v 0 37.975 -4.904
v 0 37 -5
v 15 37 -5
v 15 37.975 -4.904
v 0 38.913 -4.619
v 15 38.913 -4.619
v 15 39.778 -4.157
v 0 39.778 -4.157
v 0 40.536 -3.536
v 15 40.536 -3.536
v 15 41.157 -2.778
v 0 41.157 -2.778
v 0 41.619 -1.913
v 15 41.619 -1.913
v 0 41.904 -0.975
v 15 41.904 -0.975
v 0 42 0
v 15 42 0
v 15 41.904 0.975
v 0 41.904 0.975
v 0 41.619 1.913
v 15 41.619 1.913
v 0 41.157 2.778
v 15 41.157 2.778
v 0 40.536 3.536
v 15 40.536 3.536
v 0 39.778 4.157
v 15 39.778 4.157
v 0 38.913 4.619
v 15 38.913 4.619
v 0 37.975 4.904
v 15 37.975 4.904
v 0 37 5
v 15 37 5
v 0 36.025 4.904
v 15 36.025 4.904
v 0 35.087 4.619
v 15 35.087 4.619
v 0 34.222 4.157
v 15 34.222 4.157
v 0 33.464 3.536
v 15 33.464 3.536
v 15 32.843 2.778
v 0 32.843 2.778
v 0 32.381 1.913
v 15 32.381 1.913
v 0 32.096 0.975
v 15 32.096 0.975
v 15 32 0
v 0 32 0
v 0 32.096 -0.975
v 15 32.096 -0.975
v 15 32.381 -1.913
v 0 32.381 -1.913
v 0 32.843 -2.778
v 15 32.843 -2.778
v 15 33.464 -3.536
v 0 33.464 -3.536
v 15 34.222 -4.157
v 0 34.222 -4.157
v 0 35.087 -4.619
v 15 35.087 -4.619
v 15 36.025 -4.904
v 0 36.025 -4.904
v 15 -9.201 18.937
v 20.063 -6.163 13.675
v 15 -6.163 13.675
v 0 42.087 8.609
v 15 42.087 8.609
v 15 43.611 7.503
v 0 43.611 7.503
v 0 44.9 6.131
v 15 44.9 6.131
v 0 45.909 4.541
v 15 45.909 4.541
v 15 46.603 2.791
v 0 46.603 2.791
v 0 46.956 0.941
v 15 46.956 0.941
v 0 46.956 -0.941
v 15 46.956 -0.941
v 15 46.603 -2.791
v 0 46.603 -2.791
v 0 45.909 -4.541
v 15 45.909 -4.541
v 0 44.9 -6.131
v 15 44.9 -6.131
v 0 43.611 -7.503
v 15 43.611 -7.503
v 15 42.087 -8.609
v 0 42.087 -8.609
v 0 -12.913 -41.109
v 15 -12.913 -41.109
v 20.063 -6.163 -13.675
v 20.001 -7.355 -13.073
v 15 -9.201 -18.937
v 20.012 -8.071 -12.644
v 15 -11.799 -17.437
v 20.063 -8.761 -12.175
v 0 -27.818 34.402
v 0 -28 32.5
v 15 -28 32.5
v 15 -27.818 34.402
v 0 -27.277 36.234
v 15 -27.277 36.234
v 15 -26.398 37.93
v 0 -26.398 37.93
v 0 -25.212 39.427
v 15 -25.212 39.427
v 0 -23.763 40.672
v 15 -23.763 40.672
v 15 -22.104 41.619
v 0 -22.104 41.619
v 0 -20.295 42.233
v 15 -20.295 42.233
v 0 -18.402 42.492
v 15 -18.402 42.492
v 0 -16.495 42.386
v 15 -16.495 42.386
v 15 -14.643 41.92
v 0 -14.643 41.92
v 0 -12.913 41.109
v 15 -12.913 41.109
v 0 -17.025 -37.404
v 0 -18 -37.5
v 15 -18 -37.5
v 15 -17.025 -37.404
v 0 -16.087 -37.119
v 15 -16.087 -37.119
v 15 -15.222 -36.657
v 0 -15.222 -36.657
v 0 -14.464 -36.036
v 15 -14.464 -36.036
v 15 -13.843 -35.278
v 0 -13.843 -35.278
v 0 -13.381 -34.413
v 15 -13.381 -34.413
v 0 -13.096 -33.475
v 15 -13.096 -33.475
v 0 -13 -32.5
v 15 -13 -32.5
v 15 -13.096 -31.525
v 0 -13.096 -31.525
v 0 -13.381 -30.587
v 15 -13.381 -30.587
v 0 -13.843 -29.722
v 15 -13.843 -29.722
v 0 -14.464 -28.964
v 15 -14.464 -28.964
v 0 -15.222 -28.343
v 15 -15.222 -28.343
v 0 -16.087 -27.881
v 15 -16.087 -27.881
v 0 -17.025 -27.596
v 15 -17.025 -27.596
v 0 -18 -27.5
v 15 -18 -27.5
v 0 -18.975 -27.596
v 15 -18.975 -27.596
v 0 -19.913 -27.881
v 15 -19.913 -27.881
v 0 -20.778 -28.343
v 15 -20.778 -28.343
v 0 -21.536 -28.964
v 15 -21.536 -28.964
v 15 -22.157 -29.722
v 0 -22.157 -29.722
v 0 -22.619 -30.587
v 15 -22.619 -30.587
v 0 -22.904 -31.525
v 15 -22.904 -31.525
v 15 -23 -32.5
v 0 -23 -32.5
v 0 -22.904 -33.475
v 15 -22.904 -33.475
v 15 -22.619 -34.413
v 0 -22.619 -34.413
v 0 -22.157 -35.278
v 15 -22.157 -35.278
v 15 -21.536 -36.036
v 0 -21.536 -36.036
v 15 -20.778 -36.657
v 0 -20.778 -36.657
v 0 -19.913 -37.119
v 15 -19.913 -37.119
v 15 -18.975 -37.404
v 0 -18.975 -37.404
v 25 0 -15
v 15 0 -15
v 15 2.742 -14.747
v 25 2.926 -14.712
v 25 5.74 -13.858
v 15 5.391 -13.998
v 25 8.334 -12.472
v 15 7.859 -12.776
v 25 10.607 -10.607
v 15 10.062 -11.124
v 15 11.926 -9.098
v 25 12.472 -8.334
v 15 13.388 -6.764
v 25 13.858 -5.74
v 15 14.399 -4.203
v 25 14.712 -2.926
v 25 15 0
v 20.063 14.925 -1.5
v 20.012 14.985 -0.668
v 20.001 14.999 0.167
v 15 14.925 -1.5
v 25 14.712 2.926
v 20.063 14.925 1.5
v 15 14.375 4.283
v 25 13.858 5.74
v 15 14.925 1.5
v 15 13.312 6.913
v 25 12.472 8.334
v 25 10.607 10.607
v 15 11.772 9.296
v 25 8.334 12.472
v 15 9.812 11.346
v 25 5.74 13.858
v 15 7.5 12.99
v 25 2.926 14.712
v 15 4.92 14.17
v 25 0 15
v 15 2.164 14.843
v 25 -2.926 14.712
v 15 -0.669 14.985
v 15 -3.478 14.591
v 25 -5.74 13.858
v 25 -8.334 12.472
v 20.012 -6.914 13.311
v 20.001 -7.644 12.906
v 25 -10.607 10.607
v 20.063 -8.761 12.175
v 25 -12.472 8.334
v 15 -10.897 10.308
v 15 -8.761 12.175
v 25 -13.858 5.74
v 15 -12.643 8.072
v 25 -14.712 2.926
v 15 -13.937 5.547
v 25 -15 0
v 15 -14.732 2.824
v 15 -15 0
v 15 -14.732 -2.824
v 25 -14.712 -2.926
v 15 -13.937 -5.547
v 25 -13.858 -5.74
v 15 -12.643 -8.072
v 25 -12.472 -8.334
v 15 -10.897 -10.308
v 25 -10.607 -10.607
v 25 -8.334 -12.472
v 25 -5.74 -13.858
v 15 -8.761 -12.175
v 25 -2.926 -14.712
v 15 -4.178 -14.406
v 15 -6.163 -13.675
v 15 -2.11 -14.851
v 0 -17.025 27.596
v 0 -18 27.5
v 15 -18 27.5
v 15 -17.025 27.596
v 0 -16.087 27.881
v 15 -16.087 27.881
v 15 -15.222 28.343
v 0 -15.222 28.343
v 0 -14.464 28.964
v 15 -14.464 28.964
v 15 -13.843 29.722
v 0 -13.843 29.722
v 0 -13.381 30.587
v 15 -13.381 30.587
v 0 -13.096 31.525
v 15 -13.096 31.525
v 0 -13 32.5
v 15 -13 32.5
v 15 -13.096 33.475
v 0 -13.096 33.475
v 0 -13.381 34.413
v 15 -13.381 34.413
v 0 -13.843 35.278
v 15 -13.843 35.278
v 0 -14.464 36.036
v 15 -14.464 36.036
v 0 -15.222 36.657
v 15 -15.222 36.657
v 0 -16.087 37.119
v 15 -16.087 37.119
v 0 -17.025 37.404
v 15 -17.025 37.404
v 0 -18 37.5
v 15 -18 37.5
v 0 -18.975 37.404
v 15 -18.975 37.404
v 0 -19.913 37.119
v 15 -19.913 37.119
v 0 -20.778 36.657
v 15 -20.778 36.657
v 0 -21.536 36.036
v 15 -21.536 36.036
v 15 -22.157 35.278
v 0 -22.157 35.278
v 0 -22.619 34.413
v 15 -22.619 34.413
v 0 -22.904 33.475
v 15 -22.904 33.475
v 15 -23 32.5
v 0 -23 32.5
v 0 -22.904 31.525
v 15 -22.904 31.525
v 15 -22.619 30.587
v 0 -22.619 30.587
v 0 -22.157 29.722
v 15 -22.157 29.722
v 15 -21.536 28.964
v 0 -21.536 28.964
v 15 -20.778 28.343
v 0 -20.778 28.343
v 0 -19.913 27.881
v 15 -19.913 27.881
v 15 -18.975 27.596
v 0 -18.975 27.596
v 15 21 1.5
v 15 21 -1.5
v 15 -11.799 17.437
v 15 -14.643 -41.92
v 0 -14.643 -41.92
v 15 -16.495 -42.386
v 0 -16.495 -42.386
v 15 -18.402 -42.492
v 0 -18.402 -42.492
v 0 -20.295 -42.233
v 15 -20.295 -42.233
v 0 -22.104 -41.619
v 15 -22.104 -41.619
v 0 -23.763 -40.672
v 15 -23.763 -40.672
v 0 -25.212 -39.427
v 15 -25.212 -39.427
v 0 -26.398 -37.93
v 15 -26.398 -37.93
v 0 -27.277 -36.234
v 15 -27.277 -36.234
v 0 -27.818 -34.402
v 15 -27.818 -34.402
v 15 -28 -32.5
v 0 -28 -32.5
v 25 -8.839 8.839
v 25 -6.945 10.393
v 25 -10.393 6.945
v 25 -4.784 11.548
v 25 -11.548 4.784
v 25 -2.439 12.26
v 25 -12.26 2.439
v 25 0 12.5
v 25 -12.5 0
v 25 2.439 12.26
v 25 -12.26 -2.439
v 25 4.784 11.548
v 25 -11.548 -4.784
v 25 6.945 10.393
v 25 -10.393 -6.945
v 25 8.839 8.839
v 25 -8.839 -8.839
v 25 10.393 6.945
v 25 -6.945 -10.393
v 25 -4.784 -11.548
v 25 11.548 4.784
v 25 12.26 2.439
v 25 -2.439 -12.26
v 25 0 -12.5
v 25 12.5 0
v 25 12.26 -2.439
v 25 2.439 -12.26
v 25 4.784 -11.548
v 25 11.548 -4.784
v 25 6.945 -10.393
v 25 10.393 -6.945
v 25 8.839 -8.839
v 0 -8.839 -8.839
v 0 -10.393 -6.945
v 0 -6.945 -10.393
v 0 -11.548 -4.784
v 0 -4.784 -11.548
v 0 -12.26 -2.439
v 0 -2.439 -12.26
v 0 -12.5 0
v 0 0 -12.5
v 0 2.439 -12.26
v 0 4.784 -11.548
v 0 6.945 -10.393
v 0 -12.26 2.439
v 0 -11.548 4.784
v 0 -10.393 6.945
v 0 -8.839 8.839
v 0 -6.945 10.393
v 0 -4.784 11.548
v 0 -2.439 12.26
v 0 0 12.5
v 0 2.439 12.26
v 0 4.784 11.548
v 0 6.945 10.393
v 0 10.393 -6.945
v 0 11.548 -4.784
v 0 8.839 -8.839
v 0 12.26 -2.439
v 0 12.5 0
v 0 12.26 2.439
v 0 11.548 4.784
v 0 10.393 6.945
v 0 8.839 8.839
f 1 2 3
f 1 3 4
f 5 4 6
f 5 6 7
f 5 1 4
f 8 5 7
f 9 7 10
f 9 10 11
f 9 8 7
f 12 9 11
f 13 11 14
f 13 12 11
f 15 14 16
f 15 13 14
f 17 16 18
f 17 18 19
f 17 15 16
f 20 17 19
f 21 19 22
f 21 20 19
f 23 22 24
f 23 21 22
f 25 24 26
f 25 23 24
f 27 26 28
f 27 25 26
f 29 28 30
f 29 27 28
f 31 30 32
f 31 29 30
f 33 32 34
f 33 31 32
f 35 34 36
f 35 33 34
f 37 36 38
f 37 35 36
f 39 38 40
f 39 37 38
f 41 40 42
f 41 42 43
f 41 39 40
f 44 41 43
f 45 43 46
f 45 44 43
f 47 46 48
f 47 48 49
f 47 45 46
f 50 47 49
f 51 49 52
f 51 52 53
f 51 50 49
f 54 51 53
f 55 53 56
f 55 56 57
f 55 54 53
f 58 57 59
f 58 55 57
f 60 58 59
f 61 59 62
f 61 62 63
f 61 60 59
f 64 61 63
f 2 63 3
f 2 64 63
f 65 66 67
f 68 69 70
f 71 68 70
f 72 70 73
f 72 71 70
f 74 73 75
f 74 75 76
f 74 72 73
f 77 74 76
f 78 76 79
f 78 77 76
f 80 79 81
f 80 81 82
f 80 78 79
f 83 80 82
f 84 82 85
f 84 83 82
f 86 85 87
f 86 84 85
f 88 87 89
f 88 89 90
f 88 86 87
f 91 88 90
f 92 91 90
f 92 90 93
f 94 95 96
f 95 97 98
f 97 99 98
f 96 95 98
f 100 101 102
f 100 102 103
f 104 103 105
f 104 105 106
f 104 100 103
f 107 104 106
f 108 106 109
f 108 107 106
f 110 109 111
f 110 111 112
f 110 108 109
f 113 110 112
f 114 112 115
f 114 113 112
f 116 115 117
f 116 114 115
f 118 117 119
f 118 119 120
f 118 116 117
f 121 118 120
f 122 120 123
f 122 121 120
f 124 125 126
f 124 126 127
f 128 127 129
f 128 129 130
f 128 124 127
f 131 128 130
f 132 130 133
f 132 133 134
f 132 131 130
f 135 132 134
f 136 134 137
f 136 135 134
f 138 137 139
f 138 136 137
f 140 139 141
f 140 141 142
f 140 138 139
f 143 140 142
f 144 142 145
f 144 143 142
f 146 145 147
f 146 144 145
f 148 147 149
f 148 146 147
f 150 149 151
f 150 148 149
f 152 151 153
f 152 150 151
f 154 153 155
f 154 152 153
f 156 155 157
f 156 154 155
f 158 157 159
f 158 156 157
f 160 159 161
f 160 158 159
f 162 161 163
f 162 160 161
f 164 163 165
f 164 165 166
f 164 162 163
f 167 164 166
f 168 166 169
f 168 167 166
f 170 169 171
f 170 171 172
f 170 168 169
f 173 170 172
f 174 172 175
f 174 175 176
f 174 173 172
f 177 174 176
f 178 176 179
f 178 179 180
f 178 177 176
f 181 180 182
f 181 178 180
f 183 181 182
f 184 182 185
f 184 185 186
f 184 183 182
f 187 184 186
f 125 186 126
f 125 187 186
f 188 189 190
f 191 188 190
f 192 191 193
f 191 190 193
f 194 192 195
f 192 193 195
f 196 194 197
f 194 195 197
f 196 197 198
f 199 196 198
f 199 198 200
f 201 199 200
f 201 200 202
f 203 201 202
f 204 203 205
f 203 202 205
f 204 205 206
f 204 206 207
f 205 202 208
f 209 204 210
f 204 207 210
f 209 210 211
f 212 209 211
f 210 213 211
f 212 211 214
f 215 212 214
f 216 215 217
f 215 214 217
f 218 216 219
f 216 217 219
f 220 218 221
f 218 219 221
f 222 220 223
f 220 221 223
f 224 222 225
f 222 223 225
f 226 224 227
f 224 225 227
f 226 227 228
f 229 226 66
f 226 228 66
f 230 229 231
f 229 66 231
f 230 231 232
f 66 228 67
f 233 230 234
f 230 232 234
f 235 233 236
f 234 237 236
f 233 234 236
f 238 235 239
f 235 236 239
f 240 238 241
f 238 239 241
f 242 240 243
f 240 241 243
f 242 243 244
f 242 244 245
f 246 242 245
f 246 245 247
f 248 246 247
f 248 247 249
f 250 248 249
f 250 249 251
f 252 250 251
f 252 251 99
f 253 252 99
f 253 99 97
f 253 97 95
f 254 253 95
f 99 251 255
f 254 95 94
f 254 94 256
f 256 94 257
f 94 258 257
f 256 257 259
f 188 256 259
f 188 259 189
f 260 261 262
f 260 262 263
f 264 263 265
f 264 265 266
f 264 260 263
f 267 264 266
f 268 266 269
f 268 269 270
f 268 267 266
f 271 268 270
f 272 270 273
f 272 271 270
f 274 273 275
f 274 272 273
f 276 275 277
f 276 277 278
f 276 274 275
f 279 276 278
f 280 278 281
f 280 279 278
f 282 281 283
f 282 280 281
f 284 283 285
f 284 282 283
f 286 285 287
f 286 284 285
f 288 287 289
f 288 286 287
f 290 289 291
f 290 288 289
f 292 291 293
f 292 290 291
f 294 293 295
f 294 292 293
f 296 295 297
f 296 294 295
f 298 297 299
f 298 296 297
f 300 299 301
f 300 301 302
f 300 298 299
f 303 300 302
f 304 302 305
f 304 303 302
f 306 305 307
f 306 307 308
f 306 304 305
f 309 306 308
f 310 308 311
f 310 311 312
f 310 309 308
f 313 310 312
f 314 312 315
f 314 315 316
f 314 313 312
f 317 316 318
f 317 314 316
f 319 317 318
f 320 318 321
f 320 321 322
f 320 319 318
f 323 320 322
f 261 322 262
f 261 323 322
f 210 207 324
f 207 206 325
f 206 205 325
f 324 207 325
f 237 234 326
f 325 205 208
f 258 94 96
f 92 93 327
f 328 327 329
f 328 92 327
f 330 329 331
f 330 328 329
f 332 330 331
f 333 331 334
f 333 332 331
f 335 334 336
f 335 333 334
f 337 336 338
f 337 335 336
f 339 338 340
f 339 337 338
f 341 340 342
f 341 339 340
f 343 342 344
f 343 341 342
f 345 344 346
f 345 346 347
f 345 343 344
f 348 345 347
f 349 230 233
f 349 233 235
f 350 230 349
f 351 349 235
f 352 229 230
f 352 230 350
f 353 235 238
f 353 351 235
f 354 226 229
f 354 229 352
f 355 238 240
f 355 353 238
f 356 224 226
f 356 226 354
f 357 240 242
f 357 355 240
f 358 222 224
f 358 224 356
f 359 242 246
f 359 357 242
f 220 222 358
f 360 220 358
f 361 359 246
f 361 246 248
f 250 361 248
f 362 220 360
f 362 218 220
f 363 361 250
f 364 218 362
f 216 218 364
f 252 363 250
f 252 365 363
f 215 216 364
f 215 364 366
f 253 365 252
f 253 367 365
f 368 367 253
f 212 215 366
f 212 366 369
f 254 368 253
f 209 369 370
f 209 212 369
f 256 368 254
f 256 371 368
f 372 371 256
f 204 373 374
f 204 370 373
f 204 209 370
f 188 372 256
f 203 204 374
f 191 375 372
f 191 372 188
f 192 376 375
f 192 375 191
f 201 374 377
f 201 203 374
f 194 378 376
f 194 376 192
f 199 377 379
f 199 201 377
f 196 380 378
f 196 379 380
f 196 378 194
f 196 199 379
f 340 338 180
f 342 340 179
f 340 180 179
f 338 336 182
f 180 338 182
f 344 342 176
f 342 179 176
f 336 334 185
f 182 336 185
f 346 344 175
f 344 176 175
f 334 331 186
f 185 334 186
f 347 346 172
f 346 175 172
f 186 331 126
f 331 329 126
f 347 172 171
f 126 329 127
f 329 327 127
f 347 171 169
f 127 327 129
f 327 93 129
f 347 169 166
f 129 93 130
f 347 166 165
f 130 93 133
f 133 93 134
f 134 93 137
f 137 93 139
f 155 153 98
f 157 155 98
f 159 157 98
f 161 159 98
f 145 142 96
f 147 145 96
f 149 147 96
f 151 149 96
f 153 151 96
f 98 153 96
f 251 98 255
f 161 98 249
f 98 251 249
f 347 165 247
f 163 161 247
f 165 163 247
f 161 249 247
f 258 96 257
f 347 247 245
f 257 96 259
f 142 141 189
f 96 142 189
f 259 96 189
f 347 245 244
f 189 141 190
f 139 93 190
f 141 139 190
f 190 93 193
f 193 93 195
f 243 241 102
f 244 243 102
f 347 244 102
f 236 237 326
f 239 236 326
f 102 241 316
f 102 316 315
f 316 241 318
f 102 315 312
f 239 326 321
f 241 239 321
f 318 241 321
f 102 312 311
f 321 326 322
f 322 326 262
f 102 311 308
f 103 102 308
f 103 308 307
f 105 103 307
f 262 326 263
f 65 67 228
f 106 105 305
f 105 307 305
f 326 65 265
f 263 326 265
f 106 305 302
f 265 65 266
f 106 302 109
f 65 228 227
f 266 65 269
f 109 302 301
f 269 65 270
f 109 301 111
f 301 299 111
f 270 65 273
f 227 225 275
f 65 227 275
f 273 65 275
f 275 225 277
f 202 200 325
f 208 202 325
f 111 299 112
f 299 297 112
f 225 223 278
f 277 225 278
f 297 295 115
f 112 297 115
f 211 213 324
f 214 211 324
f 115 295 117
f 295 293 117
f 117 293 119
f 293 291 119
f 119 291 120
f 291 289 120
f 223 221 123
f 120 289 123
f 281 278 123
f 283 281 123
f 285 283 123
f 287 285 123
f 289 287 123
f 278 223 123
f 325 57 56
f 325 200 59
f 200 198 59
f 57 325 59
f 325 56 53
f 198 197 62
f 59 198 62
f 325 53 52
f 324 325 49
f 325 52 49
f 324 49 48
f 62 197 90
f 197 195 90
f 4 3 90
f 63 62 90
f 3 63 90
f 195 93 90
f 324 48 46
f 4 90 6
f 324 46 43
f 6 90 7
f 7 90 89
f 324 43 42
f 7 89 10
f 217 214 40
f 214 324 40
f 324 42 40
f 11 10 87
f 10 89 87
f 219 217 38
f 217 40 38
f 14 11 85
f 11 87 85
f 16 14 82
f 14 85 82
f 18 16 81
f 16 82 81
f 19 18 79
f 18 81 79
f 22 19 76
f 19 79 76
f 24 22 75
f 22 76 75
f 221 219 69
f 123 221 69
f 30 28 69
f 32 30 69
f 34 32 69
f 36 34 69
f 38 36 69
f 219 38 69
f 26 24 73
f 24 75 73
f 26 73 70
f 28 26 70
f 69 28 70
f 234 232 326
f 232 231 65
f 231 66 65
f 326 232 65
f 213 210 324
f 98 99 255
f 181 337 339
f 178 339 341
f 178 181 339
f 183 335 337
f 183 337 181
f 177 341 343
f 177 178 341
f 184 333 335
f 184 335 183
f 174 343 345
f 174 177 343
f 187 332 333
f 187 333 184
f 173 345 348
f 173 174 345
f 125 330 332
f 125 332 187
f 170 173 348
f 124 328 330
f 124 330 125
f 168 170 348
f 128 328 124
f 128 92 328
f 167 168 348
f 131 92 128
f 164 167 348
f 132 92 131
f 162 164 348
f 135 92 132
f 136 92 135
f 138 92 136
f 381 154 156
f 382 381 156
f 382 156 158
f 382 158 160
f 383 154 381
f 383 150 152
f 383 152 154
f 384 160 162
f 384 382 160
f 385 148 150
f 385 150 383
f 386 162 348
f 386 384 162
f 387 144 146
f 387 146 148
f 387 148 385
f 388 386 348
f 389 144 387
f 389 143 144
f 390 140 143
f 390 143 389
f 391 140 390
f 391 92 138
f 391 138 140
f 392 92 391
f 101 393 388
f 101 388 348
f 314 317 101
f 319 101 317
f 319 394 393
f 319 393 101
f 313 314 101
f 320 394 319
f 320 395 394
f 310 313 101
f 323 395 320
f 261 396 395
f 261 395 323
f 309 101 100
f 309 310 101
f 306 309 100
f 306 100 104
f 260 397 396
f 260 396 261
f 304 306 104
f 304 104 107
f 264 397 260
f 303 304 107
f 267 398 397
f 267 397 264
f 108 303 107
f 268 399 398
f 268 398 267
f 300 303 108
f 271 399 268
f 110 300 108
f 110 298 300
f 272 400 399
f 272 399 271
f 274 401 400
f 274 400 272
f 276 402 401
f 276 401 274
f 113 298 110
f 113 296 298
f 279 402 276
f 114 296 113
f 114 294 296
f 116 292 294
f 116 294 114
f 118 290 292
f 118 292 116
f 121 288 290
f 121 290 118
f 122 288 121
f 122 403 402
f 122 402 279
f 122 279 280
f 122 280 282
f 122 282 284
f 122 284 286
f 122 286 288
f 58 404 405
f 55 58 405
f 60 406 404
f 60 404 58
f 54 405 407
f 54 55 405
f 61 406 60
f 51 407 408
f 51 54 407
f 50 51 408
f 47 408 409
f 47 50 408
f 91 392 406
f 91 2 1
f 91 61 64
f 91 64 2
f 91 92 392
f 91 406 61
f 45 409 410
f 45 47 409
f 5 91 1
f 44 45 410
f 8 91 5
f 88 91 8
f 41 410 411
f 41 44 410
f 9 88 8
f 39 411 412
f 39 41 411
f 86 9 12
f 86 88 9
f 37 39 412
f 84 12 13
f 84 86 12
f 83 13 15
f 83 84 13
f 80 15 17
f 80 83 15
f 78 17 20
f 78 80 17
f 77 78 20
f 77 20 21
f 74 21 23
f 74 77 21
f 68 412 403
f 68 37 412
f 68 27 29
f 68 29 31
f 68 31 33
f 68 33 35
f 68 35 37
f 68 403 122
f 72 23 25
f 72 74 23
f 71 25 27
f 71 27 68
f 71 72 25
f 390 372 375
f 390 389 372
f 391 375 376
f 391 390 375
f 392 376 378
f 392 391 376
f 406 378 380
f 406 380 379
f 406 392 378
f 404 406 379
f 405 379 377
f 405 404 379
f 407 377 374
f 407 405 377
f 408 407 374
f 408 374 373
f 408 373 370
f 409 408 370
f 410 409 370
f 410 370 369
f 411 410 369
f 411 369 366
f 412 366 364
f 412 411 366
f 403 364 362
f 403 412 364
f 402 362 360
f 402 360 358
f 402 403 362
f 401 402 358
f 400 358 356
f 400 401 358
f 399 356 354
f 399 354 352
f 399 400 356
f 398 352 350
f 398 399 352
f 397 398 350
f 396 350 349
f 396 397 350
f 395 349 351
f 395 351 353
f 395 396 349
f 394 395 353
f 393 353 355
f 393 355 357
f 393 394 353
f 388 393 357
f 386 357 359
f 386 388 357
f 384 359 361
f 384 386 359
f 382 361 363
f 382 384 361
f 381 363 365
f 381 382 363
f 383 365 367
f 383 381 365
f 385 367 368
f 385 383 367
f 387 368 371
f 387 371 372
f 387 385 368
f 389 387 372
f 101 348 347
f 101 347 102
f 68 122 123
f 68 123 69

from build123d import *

# Parameters (mm, degrees)
SKETCH1_R           = 12.5
SKETCH1_R_2         = 5
BOSS_EXTRUDE1_DEPTH = 15
SKETCH2_R           = 15
SKETCH2_R_2         = 12.5
BOSS_EXTRUDE2_DEPTH = 10
RIB1_REACH          = 70.119
SKETCH3_WALL_W      = 146.04901068
SKETCH3_WALL_H      = 3
CIRPATTERN1_COUNT   = 3


with BuildPart() as part:
    # Sketch1 → Boss-Extrude1 (new body)
    with BuildSketch(Plane(origin=(0, 0, 0), x_dir=(0, 0, -1), z_dir=(1, 0, 0))):
        with BuildLine():
            Line((-41.109265282, -12.912706879), (-8.609265282, 42.087293121))
            ThreePointArc((-8.609265282, 42.087293121), (0, 47), (8.609265282, 42.087293121))
            Line((8.609265282, 42.087293121), (41.109265282, -12.912706879))
            ThreePointArc((41.109265282, -12.912706879), (41.185416835, -22.956161256), (32.5, -28))
            Line((32.5, -28), (-32.5, -28))
            ThreePointArc((-32.5, -28), (-41.185416835, -22.956161256), (-41.109265282, -12.912706879))
        make_face()
        Circle(SKETCH1_R, mode=Mode.SUBTRACT)
        with Locations((0, 37)):
            Circle(SKETCH1_R_2, mode=Mode.SUBTRACT)
        with Locations((32.5, -18)):
            Circle(SKETCH1_R_2, mode=Mode.SUBTRACT)
        with Locations((-32.5, -18)):
            Circle(SKETCH1_R_2, mode=Mode.SUBTRACT)
    extrude(amount=BOSS_EXTRUDE1_DEPTH)

    # Sketch2 → Boss-Extrude2 (add)
    with BuildSketch(Plane(origin=(15, 0, 0), x_dir=(0, 0, -1), z_dir=(1, 0, 0))):
        Circle(SKETCH2_R)
        Circle(SKETCH2_R_2, mode=Mode.SUBTRACT)
    extrude(amount=BOSS_EXTRUDE2_DEPTH)

    # Sketch3 wall → Rib1 (add, up to next)
    with BuildSketch(Plane(origin=(17.5, 18, 0), x_dir=(-0.640184399664, 0.768221279597, 0), z_dir=(-0.768221279597, -0.640184399664, 0)), mode=Mode.PRIVATE) as rib1_sk1:
        Rectangle(SKETCH3_WALL_W, SKETCH3_WALL_H)
    rib1_tool1 = extrude(rib1_sk1.sketch, amount=RIB1_REACH, mode=Mode.PRIVATE) - part.part
    rib1 = rib1_tool1.solids().sort_by_distance((17.5, 18, 0))[0]
    add(rib1)

    # CirPattern1: Rib1 ×3 about axis
    cirpattern1_axis = Axis((0, 0, 0), (1, 0, 0))
    for i in range(1, CIRPATTERN1_COUNT):
        add(rib1.rotate(cirpattern1_axis, i * 360 / CIRPATTERN1_COUNT))


solid = part.part
